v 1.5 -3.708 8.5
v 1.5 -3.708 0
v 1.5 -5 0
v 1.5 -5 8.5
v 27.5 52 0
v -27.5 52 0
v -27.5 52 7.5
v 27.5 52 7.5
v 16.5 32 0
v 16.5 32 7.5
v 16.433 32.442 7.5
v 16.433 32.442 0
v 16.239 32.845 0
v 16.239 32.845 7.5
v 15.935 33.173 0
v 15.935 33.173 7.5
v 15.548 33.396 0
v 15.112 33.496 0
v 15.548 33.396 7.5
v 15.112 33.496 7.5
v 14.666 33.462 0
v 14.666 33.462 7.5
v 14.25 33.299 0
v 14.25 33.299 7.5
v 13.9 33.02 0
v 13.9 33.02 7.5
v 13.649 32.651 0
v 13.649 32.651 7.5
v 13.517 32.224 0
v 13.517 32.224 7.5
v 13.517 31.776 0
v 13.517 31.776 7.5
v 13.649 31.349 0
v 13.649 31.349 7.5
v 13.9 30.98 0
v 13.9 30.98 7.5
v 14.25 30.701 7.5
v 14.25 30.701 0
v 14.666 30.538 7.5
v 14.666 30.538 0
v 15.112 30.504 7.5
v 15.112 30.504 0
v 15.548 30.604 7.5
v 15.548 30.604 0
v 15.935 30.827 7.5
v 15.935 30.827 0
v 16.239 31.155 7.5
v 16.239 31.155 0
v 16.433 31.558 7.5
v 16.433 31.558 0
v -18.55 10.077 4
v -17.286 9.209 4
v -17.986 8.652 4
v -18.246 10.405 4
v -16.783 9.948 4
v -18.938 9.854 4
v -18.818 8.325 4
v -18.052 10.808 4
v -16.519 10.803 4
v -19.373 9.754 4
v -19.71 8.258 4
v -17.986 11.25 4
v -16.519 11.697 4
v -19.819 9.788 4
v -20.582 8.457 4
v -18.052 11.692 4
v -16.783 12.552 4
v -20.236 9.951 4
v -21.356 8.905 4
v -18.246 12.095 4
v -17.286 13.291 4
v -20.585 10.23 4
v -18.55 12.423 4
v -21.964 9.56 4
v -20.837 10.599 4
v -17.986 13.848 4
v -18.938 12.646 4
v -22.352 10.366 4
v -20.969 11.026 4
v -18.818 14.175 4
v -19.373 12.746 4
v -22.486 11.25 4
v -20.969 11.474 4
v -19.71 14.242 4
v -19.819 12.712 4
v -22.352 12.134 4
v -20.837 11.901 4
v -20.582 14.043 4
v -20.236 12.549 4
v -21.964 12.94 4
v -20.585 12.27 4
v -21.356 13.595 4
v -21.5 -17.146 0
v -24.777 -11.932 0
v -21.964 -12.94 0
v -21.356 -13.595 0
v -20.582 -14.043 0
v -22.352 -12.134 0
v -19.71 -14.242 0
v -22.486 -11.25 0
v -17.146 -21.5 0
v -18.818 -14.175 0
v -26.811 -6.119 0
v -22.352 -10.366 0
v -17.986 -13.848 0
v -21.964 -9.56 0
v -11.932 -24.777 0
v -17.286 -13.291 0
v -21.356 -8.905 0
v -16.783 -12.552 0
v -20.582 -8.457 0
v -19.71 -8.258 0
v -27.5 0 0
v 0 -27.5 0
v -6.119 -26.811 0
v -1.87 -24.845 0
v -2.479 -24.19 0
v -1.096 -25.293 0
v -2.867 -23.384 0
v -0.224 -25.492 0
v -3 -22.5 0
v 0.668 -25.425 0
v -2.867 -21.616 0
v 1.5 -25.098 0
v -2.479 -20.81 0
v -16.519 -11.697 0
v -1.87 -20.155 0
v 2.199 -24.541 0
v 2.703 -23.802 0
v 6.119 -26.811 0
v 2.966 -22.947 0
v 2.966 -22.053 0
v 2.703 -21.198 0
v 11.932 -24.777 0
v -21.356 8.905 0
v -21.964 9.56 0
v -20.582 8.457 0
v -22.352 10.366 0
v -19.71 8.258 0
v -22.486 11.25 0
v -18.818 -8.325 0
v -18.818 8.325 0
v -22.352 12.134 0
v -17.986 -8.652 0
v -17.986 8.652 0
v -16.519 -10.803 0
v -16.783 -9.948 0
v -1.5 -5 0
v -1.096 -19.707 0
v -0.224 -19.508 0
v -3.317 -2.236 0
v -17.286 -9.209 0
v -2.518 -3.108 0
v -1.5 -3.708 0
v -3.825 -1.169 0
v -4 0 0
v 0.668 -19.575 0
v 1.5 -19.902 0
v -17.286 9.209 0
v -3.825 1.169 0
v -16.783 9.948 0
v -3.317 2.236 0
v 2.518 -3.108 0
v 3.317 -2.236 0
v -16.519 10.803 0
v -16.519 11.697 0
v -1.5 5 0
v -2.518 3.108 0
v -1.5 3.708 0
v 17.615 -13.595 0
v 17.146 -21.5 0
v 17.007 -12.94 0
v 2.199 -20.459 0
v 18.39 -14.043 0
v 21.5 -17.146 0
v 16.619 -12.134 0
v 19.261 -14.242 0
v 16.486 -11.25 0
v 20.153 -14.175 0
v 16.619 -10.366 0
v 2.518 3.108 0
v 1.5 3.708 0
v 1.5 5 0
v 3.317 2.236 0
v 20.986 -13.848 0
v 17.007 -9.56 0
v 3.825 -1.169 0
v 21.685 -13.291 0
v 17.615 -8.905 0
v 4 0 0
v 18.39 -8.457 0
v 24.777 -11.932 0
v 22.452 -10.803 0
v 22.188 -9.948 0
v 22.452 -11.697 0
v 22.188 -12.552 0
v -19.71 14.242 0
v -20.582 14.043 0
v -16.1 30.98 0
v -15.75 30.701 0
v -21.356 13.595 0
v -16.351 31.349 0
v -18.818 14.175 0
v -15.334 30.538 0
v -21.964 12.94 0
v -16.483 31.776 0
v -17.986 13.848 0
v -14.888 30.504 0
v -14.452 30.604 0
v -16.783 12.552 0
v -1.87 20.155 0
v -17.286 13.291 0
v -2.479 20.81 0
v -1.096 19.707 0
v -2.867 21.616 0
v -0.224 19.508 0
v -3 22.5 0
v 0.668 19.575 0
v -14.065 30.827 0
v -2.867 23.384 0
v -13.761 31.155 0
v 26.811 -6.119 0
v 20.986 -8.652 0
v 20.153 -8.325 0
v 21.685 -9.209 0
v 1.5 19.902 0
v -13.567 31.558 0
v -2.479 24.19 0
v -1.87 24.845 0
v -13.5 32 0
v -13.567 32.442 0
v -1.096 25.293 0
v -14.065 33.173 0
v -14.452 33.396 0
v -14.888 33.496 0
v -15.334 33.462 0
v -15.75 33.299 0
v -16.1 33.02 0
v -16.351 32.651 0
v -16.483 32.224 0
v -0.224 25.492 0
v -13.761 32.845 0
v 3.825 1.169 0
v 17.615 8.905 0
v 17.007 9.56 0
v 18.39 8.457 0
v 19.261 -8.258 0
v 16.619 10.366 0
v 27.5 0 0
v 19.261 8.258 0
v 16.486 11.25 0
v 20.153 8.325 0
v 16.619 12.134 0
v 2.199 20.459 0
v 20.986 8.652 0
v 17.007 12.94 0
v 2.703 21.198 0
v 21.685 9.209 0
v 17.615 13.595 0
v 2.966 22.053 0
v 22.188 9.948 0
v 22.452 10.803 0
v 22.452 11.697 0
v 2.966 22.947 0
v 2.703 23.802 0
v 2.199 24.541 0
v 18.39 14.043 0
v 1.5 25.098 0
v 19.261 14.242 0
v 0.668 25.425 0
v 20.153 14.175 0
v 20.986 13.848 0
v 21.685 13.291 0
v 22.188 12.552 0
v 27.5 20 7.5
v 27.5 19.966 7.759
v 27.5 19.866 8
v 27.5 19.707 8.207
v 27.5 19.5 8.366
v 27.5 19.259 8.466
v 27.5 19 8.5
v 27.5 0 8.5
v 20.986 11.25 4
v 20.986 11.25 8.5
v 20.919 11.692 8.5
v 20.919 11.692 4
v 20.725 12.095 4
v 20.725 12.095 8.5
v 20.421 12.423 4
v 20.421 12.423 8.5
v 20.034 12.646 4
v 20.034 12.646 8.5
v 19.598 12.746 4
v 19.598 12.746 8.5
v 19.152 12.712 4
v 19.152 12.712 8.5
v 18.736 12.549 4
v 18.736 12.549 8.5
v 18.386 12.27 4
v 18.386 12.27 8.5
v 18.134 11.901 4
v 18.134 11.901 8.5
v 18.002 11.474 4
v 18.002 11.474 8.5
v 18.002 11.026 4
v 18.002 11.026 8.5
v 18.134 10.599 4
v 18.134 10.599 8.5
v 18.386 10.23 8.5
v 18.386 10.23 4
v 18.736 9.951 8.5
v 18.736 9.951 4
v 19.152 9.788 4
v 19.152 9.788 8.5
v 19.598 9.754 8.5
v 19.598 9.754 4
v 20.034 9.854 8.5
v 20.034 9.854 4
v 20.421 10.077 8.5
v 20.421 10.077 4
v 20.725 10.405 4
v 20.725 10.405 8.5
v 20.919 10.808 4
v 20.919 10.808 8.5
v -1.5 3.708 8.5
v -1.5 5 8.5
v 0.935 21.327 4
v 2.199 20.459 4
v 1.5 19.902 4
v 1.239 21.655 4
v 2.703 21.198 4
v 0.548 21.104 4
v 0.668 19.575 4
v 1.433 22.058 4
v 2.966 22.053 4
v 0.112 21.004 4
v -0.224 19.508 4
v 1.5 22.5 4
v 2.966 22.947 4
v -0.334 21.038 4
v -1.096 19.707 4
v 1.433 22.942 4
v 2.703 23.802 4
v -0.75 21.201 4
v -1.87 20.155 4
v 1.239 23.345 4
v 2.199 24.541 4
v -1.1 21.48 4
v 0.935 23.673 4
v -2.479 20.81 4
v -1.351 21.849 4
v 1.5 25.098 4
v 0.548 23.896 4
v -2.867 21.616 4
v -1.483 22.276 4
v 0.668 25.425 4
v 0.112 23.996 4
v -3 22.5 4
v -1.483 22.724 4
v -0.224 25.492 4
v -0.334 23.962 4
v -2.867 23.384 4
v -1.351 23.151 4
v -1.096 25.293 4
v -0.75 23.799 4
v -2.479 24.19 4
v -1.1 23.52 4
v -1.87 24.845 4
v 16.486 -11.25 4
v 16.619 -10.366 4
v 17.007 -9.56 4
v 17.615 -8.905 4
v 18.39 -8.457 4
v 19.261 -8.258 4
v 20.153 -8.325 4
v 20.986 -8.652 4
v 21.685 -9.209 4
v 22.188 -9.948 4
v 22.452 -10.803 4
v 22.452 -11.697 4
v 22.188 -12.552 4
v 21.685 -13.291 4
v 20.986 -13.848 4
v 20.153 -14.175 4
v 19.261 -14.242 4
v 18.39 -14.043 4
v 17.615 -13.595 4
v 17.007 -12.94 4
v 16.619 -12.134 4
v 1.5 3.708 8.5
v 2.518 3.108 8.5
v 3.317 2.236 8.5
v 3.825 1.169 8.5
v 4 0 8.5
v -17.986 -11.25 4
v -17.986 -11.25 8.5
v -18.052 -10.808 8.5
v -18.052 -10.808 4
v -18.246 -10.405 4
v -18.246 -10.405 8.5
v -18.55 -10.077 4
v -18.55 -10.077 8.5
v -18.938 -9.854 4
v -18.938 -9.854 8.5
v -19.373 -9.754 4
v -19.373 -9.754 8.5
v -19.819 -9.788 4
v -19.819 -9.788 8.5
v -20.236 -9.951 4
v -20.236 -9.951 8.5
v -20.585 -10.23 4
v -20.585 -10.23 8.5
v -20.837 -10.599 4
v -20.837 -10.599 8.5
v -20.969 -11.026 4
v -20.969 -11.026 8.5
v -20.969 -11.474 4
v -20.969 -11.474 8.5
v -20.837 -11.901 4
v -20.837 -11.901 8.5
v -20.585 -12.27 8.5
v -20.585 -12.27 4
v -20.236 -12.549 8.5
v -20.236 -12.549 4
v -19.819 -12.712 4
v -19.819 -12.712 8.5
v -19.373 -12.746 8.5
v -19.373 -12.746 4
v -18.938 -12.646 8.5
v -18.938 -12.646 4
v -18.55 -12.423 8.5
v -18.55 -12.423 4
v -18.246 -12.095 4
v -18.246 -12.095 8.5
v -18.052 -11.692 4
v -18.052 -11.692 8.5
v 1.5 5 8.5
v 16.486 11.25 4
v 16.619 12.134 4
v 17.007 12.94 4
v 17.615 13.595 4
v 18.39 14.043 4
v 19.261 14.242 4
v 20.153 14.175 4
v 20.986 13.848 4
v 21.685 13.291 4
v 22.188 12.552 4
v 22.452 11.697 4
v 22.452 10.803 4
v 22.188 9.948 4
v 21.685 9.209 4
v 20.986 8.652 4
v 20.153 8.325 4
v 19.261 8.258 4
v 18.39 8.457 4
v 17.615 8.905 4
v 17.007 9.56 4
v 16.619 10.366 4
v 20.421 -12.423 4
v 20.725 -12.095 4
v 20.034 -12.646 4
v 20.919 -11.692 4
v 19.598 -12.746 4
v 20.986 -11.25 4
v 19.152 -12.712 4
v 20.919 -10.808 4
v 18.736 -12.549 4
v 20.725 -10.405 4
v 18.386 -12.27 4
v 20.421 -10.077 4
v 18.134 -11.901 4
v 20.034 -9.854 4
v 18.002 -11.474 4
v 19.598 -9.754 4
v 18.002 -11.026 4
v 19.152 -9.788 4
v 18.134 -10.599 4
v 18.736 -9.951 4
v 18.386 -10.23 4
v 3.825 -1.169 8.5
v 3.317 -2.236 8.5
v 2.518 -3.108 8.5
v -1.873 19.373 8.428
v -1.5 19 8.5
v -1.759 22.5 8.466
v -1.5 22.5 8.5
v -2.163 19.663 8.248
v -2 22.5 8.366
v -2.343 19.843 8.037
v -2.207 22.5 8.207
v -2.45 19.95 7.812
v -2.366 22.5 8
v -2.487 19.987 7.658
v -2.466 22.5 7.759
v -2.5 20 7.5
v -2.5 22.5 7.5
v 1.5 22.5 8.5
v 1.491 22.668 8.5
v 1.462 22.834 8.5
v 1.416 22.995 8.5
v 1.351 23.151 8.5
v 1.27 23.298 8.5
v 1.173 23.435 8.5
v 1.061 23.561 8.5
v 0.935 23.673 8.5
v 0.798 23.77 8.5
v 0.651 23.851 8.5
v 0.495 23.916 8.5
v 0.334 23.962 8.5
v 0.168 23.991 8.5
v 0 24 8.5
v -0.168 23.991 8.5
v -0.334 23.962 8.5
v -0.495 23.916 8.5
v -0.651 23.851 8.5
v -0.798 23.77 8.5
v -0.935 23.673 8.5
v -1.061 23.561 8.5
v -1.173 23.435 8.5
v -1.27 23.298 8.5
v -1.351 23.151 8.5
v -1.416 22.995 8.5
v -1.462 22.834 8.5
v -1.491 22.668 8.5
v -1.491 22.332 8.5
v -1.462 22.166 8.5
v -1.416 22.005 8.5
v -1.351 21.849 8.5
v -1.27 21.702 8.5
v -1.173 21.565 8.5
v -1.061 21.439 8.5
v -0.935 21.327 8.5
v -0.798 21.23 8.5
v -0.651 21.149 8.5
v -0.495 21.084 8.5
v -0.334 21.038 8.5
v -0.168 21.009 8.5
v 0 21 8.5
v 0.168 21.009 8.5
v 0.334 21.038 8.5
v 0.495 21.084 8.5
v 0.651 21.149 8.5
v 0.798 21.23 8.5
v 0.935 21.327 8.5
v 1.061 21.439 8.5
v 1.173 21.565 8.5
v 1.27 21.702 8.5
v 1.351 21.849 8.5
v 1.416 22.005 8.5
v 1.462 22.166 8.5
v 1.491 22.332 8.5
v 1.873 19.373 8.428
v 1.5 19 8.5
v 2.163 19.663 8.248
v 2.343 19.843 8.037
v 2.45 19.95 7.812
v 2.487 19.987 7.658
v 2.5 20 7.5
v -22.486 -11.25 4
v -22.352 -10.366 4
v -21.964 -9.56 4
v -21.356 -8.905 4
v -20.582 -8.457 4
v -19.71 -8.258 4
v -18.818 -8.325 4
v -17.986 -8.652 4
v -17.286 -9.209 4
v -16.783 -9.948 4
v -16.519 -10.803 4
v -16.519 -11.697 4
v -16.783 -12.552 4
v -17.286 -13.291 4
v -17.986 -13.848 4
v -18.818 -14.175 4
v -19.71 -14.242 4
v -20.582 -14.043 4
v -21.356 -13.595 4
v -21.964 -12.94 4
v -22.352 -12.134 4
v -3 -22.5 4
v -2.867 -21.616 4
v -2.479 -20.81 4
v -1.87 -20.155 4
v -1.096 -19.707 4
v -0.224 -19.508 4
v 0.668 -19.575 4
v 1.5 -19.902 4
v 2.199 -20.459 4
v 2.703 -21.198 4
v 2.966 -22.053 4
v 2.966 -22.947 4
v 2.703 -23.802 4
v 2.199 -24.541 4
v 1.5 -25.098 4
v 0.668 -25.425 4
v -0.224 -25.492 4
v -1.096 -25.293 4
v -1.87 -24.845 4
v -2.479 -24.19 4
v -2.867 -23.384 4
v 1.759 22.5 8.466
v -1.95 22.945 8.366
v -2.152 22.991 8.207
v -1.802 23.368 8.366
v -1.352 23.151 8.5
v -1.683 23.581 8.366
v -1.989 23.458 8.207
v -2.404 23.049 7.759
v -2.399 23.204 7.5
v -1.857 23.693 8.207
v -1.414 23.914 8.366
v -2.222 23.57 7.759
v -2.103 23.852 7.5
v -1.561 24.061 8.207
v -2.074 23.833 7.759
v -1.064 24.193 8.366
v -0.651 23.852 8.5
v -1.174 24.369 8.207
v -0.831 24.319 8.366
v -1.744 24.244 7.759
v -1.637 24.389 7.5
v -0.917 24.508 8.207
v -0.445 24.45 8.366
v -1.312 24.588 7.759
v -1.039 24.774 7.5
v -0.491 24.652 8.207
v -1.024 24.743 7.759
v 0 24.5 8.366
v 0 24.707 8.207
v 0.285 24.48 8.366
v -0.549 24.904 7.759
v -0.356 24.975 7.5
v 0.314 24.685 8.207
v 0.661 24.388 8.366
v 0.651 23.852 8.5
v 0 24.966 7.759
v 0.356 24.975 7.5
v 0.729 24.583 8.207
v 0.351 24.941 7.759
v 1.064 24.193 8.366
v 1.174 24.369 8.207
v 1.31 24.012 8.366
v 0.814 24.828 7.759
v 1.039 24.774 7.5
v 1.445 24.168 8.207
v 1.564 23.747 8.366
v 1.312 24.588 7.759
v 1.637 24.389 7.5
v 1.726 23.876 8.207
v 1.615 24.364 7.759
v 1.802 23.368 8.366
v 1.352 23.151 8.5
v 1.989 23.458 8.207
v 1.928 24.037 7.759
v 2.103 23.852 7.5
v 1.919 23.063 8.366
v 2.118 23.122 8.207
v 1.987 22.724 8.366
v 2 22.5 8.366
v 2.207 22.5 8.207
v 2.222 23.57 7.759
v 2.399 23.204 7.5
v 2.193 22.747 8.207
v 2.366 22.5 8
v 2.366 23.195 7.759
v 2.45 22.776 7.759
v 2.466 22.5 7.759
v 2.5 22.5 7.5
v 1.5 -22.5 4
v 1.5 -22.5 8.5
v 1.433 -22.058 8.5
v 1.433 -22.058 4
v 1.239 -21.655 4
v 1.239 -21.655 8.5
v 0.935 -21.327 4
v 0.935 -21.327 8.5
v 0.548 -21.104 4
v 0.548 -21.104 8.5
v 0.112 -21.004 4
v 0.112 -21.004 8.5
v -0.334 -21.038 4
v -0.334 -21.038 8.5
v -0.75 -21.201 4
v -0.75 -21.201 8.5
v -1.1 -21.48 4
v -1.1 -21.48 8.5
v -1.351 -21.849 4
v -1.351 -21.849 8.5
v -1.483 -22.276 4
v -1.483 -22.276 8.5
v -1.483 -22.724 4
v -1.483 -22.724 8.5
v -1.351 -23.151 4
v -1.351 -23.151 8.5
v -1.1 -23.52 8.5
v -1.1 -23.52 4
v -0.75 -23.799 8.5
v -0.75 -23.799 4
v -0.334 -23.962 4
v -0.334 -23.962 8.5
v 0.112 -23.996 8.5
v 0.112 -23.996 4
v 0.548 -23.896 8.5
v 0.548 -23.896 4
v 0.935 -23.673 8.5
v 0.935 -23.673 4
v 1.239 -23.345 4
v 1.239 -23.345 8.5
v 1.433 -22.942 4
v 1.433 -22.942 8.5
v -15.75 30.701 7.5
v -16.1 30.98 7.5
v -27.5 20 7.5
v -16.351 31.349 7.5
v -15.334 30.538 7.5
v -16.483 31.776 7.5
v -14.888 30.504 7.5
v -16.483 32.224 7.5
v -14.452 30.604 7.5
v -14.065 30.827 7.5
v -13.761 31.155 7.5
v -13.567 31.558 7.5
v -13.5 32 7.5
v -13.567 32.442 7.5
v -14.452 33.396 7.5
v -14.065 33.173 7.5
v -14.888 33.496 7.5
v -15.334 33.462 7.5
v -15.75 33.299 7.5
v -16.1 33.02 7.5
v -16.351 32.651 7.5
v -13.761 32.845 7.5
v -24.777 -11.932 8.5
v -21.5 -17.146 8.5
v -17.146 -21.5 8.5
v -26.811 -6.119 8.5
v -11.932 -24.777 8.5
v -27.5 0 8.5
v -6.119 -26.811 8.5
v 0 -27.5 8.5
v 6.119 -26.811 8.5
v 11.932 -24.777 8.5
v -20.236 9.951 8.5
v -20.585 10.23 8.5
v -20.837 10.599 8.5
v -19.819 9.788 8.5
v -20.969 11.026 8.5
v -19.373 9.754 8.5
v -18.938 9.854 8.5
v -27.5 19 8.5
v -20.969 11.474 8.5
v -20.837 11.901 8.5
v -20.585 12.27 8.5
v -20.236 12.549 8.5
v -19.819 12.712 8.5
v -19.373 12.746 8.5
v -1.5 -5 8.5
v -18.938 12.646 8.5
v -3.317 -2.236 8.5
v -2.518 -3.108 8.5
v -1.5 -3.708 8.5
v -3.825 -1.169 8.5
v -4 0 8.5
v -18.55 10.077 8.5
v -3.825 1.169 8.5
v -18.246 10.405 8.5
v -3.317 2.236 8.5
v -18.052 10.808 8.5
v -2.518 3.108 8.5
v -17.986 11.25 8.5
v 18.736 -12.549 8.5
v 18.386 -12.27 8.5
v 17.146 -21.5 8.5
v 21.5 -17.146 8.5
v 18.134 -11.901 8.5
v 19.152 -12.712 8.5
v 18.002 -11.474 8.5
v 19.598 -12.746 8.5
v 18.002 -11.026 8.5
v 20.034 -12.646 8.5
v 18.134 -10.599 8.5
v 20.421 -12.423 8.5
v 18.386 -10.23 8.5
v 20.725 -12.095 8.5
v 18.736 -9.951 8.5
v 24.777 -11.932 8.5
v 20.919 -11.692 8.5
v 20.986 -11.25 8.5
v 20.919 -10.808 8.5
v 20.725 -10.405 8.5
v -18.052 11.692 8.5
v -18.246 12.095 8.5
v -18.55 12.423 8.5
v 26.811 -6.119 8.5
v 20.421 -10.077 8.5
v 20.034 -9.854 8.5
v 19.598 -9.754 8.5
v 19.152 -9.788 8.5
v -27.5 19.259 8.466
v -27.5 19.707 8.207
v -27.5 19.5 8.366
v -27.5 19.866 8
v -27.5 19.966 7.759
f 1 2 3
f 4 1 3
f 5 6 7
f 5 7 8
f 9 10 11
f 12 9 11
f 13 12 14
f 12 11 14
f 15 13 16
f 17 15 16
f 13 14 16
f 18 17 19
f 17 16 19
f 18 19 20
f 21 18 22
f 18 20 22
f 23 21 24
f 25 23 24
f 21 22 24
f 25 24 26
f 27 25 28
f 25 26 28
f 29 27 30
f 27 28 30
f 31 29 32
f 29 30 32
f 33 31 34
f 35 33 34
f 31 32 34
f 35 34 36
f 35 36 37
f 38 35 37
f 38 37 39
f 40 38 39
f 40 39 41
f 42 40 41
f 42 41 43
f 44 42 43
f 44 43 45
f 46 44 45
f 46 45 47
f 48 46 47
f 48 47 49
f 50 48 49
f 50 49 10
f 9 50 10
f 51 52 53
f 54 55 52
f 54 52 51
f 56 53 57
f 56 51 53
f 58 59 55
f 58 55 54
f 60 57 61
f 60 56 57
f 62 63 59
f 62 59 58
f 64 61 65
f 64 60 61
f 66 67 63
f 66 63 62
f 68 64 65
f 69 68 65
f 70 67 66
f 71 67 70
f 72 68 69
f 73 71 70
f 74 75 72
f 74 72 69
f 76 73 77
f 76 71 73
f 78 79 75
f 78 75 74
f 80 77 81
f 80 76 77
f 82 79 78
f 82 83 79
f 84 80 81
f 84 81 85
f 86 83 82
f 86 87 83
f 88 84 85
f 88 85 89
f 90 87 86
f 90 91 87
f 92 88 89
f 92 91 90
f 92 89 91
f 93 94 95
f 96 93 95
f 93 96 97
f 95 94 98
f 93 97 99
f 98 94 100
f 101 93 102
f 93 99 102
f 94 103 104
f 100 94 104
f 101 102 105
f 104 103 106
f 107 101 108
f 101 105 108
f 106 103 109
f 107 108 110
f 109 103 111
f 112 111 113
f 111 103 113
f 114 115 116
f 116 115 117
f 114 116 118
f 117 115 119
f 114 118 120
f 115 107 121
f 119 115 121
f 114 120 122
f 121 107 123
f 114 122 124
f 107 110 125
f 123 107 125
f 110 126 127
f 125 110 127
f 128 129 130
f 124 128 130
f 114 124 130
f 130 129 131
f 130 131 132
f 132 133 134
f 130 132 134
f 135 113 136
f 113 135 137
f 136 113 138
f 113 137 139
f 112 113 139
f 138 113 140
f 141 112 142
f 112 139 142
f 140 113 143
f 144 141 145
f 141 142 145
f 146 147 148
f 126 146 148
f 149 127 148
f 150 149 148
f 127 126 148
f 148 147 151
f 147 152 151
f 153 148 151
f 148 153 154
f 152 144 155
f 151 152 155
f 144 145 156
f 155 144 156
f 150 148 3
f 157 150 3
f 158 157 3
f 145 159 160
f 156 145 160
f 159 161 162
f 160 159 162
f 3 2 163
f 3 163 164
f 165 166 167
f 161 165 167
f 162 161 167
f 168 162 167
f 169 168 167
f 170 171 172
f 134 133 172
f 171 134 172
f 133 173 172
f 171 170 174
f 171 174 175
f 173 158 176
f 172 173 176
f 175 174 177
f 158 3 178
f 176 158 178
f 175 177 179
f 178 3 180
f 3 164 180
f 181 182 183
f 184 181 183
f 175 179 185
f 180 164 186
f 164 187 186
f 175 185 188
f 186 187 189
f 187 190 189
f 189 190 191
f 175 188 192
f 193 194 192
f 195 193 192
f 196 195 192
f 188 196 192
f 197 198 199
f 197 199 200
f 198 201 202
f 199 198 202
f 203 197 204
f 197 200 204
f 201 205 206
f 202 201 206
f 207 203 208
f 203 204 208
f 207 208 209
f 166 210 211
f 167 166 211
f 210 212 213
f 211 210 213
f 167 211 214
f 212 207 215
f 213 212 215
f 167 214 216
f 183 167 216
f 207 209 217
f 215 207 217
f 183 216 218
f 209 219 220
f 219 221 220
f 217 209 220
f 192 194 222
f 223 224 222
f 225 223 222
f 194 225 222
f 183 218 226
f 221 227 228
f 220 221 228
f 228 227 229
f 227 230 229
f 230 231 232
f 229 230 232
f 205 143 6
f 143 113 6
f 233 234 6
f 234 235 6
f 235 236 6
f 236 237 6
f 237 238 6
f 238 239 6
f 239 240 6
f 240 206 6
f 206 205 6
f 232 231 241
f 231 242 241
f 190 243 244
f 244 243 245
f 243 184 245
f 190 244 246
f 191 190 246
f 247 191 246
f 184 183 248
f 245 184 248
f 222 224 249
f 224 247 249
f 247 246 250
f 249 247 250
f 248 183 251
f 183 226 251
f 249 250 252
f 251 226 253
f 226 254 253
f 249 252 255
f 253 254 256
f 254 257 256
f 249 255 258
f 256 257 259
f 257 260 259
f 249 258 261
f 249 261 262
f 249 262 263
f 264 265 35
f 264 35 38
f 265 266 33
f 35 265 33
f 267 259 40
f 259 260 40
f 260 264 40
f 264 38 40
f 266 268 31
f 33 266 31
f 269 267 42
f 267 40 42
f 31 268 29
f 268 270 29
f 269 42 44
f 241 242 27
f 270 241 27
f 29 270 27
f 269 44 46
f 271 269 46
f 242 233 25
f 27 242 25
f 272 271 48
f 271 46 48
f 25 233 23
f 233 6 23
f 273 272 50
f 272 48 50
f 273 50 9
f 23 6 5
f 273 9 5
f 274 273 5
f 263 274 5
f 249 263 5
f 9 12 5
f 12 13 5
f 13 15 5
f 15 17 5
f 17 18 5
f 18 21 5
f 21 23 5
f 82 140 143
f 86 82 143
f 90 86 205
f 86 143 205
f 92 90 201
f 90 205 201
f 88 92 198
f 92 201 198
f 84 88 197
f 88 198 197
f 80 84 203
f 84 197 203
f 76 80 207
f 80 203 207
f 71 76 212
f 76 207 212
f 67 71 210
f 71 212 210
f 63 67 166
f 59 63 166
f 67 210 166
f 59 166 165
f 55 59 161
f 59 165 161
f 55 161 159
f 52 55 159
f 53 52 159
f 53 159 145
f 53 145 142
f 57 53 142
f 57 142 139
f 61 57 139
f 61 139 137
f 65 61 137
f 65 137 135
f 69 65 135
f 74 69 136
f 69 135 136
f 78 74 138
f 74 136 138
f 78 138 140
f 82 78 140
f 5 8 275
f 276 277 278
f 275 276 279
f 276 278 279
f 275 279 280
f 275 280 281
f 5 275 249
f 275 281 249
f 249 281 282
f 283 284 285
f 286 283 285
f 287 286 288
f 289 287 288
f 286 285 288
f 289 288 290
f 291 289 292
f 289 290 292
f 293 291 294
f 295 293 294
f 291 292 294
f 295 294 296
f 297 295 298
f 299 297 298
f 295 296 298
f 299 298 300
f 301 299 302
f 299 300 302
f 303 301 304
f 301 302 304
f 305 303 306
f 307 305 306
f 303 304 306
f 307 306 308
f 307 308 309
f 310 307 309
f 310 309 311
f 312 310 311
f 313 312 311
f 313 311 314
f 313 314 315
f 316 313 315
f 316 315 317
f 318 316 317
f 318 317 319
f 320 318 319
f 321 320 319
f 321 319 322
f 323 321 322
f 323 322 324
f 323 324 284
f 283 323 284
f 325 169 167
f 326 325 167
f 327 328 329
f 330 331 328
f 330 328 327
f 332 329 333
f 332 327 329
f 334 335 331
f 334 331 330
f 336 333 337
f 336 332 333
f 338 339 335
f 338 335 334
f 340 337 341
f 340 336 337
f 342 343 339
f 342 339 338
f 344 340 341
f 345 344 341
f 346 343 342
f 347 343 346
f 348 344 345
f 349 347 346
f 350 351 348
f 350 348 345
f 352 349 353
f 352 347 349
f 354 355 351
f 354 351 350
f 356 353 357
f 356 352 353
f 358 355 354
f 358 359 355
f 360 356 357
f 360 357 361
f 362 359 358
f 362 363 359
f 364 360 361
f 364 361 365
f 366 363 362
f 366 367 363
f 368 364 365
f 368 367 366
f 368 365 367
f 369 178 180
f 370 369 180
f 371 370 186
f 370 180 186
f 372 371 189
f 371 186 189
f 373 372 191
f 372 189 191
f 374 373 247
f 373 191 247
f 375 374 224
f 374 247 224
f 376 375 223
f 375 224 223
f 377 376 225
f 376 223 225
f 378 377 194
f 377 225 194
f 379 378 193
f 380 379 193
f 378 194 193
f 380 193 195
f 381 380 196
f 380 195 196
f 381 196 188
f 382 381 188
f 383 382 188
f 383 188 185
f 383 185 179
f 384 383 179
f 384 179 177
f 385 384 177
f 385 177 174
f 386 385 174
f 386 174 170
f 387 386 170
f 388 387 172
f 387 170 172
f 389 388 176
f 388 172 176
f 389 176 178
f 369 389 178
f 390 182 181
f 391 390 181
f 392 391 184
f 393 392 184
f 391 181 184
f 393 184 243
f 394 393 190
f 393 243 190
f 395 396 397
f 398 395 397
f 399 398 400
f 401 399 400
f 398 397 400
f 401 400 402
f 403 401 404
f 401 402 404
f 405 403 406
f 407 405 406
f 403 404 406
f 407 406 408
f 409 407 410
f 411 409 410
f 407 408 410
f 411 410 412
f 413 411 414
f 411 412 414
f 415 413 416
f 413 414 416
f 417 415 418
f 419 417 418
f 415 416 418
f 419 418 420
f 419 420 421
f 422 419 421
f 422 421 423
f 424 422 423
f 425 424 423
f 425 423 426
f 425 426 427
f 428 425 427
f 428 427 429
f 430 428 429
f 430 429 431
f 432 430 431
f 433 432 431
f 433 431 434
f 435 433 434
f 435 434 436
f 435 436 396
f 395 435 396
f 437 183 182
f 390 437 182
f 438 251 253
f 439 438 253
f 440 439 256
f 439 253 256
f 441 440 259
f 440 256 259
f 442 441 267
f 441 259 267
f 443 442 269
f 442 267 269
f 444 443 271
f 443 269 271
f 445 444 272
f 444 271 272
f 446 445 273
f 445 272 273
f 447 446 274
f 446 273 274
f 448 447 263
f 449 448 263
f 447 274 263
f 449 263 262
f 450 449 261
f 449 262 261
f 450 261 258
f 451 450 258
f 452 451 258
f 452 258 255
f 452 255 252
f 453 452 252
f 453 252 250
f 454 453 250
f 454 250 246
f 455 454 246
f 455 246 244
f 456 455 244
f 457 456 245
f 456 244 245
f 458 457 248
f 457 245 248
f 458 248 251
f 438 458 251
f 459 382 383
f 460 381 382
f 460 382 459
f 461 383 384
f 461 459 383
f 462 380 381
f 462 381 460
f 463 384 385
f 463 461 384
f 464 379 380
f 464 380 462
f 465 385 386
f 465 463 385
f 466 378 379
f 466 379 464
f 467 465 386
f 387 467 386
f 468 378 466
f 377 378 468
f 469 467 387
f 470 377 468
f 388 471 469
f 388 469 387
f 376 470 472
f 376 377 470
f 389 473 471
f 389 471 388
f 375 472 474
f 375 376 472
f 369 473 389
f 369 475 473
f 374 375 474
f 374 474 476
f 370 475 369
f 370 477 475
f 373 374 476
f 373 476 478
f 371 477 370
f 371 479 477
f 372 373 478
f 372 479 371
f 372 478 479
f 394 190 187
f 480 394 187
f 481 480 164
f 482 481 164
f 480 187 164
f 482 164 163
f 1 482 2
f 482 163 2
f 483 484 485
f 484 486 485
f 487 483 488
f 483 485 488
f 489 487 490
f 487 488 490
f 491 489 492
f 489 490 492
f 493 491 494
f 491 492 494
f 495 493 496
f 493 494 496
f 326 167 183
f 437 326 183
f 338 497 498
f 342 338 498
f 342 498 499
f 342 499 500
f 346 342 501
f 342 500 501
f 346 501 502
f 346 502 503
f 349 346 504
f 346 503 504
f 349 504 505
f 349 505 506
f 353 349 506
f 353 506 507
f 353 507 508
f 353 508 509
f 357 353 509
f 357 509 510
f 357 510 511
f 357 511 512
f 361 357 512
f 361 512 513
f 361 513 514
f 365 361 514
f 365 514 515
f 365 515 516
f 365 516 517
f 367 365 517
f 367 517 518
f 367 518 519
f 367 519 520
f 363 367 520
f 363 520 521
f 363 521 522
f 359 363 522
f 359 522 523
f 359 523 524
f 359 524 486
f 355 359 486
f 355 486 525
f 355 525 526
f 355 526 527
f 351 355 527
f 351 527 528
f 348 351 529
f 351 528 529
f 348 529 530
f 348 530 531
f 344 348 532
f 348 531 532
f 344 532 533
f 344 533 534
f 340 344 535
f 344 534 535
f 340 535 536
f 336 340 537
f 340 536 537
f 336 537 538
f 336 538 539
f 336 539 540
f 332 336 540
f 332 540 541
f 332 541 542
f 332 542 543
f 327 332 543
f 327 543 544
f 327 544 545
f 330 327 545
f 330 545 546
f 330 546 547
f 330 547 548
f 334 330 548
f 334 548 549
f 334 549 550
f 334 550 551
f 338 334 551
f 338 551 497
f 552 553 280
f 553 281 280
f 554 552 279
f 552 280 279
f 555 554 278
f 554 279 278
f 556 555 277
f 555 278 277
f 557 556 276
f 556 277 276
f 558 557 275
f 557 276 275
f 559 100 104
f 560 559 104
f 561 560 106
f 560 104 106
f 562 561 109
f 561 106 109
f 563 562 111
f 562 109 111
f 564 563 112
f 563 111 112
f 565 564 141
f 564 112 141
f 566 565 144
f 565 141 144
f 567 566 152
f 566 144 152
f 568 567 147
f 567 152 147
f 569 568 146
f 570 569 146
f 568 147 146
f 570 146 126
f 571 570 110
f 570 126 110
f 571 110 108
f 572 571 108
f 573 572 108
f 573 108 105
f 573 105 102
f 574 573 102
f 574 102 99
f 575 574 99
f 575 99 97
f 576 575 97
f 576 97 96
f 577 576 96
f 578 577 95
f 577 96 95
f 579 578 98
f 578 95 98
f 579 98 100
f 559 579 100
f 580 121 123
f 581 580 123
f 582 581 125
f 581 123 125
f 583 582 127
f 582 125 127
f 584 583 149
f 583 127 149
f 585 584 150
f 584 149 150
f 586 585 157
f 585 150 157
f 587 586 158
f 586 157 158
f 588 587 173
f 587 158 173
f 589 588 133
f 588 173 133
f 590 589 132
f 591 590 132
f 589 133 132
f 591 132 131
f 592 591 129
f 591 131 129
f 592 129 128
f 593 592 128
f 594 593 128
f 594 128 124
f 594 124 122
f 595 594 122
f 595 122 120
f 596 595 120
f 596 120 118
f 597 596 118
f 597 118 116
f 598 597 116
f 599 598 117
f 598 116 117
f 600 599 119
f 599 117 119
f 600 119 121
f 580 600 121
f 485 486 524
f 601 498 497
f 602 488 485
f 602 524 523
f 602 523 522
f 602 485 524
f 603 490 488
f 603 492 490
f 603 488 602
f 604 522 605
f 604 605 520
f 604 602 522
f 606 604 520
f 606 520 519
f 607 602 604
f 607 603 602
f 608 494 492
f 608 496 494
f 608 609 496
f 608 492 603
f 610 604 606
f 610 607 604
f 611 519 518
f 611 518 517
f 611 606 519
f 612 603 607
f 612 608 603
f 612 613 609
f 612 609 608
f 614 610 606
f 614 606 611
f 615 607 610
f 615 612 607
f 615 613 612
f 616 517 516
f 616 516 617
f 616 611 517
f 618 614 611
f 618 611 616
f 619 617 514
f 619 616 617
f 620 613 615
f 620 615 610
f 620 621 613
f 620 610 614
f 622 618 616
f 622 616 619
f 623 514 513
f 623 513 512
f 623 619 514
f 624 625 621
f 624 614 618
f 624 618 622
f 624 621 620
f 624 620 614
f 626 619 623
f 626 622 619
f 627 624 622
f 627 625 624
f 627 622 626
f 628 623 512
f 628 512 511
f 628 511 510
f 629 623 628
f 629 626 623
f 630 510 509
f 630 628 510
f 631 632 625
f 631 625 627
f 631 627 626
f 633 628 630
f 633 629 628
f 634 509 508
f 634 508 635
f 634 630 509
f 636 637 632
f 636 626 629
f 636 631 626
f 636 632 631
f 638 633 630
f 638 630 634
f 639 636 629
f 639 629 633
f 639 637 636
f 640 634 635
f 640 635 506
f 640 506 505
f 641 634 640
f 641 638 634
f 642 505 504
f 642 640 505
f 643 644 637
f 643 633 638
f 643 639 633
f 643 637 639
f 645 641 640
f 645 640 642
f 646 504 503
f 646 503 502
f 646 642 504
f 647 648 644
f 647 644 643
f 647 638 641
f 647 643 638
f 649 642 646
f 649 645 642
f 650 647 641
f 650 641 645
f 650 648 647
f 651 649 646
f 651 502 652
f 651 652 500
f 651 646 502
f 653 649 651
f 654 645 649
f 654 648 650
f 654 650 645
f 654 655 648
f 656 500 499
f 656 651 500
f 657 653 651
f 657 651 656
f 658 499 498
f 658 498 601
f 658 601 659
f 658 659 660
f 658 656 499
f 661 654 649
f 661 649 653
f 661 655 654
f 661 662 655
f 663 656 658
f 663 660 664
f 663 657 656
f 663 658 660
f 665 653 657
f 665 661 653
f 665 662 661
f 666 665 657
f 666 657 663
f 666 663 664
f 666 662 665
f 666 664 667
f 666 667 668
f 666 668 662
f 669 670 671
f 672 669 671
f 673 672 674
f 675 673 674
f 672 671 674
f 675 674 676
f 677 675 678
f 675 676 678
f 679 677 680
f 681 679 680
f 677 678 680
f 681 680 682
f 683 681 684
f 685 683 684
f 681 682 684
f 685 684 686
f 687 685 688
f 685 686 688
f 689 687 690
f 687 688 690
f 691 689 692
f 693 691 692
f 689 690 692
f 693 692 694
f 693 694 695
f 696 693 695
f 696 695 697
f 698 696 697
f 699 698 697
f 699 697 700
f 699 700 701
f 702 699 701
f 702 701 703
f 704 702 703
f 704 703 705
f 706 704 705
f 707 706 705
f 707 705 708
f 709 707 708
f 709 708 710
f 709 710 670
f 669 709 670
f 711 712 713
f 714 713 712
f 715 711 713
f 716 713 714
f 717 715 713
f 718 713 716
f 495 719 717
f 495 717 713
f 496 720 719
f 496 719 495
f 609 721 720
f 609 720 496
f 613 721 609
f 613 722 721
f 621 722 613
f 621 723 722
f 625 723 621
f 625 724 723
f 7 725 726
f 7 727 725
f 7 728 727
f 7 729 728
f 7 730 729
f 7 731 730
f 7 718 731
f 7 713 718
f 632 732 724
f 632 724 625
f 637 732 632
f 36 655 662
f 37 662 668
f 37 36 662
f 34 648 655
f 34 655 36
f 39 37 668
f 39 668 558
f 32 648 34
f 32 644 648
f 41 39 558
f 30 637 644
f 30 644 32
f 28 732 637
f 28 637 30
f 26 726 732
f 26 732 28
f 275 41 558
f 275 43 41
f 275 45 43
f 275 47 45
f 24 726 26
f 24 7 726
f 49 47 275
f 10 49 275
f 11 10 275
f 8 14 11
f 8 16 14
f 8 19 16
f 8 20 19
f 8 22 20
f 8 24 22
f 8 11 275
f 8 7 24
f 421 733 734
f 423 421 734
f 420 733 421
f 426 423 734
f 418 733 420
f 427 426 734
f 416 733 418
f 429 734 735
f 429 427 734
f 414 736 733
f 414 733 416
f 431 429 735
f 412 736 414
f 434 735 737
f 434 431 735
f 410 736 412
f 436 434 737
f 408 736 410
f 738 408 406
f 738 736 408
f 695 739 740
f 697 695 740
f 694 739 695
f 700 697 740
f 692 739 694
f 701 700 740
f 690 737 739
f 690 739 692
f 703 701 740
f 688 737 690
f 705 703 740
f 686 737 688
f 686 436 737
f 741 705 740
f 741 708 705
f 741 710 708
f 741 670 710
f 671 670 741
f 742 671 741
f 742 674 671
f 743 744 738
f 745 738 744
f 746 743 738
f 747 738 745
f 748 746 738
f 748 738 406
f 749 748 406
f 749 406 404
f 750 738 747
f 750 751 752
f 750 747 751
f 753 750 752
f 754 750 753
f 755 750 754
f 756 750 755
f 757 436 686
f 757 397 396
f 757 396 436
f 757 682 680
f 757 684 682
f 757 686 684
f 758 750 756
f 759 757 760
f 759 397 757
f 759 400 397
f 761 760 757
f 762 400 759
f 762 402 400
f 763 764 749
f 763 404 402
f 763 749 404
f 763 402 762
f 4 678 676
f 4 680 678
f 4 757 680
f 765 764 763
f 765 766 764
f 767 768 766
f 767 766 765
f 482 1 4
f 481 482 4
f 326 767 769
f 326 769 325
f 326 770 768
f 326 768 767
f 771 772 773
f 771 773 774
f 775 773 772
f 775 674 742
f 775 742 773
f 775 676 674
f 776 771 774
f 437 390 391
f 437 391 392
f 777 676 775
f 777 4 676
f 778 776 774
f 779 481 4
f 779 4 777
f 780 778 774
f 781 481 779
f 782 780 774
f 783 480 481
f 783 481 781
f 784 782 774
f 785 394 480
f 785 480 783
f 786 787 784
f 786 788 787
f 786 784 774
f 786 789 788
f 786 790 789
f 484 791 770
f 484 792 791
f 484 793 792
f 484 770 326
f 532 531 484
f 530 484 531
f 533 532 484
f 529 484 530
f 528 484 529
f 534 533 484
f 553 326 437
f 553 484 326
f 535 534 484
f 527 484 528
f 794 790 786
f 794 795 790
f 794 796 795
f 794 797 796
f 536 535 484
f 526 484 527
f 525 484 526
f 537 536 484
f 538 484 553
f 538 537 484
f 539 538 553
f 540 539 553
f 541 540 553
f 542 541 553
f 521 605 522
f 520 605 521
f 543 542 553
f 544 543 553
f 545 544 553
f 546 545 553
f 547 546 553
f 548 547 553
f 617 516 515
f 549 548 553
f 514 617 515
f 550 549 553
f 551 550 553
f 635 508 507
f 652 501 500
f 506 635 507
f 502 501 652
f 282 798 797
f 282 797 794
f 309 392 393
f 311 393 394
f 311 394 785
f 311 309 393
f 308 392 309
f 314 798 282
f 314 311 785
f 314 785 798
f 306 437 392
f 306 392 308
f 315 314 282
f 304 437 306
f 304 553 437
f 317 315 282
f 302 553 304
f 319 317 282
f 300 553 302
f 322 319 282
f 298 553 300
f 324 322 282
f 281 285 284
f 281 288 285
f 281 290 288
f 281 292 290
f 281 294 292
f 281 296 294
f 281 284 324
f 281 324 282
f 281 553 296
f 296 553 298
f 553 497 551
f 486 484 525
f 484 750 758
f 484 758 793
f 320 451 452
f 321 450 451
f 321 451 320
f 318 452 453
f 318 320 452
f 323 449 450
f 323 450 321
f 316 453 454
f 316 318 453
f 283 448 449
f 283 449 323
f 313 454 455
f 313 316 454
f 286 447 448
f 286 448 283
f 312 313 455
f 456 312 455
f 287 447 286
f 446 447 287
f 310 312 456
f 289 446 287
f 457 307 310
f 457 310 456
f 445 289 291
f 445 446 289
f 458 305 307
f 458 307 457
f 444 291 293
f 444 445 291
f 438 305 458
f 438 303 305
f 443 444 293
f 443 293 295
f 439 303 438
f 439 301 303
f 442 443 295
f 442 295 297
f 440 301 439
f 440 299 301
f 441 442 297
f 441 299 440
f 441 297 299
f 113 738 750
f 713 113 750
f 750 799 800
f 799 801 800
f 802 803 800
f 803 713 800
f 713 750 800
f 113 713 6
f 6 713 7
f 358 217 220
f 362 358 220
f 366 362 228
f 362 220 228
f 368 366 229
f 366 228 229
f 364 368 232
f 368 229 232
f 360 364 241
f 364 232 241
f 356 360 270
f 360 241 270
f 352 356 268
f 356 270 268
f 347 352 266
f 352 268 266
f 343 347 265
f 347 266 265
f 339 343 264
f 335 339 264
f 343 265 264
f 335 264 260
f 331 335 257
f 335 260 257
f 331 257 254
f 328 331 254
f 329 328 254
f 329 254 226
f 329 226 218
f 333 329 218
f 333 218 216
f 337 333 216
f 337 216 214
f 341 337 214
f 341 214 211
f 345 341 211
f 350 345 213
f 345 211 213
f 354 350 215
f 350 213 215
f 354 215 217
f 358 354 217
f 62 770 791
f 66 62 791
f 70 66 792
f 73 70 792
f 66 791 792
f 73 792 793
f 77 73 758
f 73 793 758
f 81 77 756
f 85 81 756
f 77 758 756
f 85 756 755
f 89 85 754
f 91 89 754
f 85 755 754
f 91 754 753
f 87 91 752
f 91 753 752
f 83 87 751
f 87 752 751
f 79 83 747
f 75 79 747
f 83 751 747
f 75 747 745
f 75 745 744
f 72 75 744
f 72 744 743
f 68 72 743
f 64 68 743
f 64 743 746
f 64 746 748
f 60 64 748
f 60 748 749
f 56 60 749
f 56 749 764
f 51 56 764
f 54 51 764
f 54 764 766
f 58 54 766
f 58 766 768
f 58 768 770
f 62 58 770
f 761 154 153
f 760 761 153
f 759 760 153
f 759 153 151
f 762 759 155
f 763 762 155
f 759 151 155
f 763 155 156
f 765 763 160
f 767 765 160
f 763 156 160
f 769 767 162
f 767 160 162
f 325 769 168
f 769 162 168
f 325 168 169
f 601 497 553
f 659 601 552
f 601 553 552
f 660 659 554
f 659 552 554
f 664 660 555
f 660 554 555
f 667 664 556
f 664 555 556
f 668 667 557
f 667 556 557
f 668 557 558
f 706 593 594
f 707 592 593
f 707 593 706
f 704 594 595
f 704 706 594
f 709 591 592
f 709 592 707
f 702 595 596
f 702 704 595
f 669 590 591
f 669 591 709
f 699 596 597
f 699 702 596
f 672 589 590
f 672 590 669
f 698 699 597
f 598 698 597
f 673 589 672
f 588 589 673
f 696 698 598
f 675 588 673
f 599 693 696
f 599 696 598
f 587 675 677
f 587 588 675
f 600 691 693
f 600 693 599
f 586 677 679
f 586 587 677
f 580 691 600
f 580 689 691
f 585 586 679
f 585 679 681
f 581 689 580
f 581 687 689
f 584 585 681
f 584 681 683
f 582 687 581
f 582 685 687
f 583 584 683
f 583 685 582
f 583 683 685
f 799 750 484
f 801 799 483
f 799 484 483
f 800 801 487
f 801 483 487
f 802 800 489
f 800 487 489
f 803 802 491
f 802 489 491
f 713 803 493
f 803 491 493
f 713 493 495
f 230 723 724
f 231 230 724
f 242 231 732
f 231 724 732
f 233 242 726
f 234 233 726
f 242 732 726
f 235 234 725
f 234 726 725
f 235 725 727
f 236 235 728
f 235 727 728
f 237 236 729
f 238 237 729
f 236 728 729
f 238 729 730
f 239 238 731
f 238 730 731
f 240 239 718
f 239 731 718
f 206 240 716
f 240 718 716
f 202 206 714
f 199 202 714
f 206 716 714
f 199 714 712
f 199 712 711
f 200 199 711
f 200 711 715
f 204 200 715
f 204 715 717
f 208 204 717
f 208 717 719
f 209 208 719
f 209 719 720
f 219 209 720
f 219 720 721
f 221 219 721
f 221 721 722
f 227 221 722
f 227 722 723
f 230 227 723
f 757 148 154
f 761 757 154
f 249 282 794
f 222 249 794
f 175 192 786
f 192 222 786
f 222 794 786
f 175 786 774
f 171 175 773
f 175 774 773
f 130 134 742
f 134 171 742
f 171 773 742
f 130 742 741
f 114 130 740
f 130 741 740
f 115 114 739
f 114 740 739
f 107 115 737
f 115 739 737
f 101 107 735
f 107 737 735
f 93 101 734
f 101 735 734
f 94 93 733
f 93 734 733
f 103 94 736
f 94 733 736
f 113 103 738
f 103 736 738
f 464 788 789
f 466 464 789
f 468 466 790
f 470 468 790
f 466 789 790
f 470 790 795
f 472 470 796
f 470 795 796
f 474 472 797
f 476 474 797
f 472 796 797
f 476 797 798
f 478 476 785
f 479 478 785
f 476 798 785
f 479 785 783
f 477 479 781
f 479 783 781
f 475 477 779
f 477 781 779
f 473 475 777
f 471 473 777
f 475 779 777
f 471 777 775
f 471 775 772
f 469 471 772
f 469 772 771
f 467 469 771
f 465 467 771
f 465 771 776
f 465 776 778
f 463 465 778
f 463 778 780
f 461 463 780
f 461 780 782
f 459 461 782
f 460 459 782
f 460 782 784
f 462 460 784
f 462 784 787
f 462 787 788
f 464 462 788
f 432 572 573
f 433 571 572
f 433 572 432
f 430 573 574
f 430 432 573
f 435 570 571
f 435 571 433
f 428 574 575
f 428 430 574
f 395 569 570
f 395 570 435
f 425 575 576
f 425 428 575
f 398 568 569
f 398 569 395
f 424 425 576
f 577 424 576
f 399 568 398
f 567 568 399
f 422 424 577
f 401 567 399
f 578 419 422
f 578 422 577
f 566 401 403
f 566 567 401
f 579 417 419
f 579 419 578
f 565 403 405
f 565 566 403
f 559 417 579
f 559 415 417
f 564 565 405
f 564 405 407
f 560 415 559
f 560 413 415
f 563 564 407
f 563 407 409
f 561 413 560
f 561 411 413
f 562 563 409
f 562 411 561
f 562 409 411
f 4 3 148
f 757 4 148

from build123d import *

# Parameters (mm, degrees)
ESQUISSE1_W             = 100
ESQUISSE1_H             = 100.548113933
BOSS_EXTRU_1_DEPTH      = 8.5
ESQUISSE2_R             = 1.5
ENL_V_MAT_EXTRU_1_DEPTH = 73.637800077
ENL_V_MAT_EXTRU_6_DEPTH = 1
CONG_4_R                = 1
ESQUISSE4_R             = 3
ENL_V_MAT_EXTRU_7_DEPTH = 4


with BuildPart() as part:
    # Esquisse1 → Boss.-Extru.1 (new body)
    with BuildSketch(Plane.XY):
        with Locations((0, 1.725943033)):
            Rectangle(ESQUISSE1_W, ESQUISSE1_H)
        with BuildLine():
            Line((-1.5, 3.708099244), (-1.5, 5))
            Line((-1.5, 5), (1.5, 5))
            Line((1.5, 5), (1.5, 3.708099244))
            ThreePointArc((1.5, 3.708099244), (3.31662479, 2.236067977), (4, 0))
            ThreePointArc((4, 0), (3.31662479, -2.236067977), (1.5, -3.708099244))
            Line((1.5, -3.708099244), (1.5, -5))
            Line((1.5, -5), (-1.5, -5))
            Line((-1.5, -5), (-1.5, -3.708099244))
            ThreePointArc((-1.5, -3.708099244), (-4, 0), (-1.5, 3.708099244))
        make_face(mode=Mode.SUBTRACT)
    extrude(amount=BOSS_EXTRU_1_DEPTH)

    # Esquisse2 → Enlèv. mat.-Extru.1 (cut, through all)
    with BuildSketch(Plane.XY.offset(8.5)):
        with BuildLine():
            ThreePointArc((27.5, 0), (0, -27.5), (-27.5, 0))
            Line((-27.5, 0), (-27.5, 52))
            Line((-27.5, 52), (-50, 52))
            Line((-50, 52), (-50, -48.548113933))
            Line((-50, -48.548113933), (50, -48.548113933))
            Line((50, -48.548113933), (50, 52))
            Line((50, 52), (27.5, 52))
            Line((27.5, 52), (27.5, 0))
        make_face()
        with Locations((0, 22.5)):
            Circle(ESQUISSE2_R)
        with Locations((19.485571585, 11.25)):
            Circle(ESQUISSE2_R)
        with Locations((19.485571585, -11.25)):
            Circle(ESQUISSE2_R)
        with Locations((0, -22.5)):
            Circle(ESQUISSE2_R)
        with Locations((-19.485571585, -11.25)):
            Circle(ESQUISSE2_R)
        with Locations((-19.485571585, 11.25)):
            Circle(ESQUISSE2_R)
        with Locations((-15, 32)):
            Circle(ESQUISSE2_R)
        with Locations((15, 32)):
            Circle(ESQUISSE2_R)
    extrude(amount=-ENL_V_MAT_EXTRU_1_DEPTH, mode=Mode.SUBTRACT)

    # Esquisse3 → Enlèv. mat.-Extru.6 (cut)
    with BuildSketch(Plane.XY.offset(8.5)):
        with BuildLine():
            Line((27.5, 52), (-27.5, 52))
            Line((-27.5, 52), (-27.5, 20))
            Line((-27.5, 20), (-2.5, 20))
            Line((-2.5, 20), (-2.5, 22.5))
            ThreePointArc((-2.5, 22.5), (0, 25), (2.5, 22.5))
            Line((2.5, 22.5), (2.5, 20))
            Line((2.5, 20), (27.5, 20))
            Line((27.5, 20), (27.5, 52))
        make_face()
    extrude(amount=-ENL_V_MAT_EXTRU_6_DEPTH, mode=Mode.SUBTRACT)

    # Congé4
    cong_4_edges = [part.edges().sort_by_distance(p)[0] for p in [
        (-15, 20, 8.5),
        (15, 20, 8.5),
        (2.5, 21.25, 8.5),
        (-2.5, 21.25, 8.5),
        (0, 25, 8.5),
    ]]
    fillet(cong_4_edges, radius=CONG_4_R - 0.0001)  # a hair under: the kernel refuses the full size

    # Esquisse4 → Enlèv. mat.-Extru.7 (cut)
    with BuildSketch(Plane(origin=(0, 0, 0), x_dir=(-1, 0, 0), z_dir=(0, 0, -1))):
        with Locations((0, 22.5)):
            Circle(ESQUISSE4_R)
        with Locations((19.485571585, 11.25)):
            Circle(ESQUISSE4_R)
        with Locations((19.485571585, -11.25)):
            Circle(ESQUISSE4_R)
        with Locations((0, -22.5)):
            Circle(ESQUISSE4_R)
        with Locations((-19.485571585, -11.25)):
            Circle(ESQUISSE4_R)
        with Locations((-19.485571585, 11.25)):
            Circle(ESQUISSE4_R)
    extrude(amount=-ENL_V_MAT_EXTRU_7_DEPTH, mode=Mode.SUBTRACT)


solid = part.part
